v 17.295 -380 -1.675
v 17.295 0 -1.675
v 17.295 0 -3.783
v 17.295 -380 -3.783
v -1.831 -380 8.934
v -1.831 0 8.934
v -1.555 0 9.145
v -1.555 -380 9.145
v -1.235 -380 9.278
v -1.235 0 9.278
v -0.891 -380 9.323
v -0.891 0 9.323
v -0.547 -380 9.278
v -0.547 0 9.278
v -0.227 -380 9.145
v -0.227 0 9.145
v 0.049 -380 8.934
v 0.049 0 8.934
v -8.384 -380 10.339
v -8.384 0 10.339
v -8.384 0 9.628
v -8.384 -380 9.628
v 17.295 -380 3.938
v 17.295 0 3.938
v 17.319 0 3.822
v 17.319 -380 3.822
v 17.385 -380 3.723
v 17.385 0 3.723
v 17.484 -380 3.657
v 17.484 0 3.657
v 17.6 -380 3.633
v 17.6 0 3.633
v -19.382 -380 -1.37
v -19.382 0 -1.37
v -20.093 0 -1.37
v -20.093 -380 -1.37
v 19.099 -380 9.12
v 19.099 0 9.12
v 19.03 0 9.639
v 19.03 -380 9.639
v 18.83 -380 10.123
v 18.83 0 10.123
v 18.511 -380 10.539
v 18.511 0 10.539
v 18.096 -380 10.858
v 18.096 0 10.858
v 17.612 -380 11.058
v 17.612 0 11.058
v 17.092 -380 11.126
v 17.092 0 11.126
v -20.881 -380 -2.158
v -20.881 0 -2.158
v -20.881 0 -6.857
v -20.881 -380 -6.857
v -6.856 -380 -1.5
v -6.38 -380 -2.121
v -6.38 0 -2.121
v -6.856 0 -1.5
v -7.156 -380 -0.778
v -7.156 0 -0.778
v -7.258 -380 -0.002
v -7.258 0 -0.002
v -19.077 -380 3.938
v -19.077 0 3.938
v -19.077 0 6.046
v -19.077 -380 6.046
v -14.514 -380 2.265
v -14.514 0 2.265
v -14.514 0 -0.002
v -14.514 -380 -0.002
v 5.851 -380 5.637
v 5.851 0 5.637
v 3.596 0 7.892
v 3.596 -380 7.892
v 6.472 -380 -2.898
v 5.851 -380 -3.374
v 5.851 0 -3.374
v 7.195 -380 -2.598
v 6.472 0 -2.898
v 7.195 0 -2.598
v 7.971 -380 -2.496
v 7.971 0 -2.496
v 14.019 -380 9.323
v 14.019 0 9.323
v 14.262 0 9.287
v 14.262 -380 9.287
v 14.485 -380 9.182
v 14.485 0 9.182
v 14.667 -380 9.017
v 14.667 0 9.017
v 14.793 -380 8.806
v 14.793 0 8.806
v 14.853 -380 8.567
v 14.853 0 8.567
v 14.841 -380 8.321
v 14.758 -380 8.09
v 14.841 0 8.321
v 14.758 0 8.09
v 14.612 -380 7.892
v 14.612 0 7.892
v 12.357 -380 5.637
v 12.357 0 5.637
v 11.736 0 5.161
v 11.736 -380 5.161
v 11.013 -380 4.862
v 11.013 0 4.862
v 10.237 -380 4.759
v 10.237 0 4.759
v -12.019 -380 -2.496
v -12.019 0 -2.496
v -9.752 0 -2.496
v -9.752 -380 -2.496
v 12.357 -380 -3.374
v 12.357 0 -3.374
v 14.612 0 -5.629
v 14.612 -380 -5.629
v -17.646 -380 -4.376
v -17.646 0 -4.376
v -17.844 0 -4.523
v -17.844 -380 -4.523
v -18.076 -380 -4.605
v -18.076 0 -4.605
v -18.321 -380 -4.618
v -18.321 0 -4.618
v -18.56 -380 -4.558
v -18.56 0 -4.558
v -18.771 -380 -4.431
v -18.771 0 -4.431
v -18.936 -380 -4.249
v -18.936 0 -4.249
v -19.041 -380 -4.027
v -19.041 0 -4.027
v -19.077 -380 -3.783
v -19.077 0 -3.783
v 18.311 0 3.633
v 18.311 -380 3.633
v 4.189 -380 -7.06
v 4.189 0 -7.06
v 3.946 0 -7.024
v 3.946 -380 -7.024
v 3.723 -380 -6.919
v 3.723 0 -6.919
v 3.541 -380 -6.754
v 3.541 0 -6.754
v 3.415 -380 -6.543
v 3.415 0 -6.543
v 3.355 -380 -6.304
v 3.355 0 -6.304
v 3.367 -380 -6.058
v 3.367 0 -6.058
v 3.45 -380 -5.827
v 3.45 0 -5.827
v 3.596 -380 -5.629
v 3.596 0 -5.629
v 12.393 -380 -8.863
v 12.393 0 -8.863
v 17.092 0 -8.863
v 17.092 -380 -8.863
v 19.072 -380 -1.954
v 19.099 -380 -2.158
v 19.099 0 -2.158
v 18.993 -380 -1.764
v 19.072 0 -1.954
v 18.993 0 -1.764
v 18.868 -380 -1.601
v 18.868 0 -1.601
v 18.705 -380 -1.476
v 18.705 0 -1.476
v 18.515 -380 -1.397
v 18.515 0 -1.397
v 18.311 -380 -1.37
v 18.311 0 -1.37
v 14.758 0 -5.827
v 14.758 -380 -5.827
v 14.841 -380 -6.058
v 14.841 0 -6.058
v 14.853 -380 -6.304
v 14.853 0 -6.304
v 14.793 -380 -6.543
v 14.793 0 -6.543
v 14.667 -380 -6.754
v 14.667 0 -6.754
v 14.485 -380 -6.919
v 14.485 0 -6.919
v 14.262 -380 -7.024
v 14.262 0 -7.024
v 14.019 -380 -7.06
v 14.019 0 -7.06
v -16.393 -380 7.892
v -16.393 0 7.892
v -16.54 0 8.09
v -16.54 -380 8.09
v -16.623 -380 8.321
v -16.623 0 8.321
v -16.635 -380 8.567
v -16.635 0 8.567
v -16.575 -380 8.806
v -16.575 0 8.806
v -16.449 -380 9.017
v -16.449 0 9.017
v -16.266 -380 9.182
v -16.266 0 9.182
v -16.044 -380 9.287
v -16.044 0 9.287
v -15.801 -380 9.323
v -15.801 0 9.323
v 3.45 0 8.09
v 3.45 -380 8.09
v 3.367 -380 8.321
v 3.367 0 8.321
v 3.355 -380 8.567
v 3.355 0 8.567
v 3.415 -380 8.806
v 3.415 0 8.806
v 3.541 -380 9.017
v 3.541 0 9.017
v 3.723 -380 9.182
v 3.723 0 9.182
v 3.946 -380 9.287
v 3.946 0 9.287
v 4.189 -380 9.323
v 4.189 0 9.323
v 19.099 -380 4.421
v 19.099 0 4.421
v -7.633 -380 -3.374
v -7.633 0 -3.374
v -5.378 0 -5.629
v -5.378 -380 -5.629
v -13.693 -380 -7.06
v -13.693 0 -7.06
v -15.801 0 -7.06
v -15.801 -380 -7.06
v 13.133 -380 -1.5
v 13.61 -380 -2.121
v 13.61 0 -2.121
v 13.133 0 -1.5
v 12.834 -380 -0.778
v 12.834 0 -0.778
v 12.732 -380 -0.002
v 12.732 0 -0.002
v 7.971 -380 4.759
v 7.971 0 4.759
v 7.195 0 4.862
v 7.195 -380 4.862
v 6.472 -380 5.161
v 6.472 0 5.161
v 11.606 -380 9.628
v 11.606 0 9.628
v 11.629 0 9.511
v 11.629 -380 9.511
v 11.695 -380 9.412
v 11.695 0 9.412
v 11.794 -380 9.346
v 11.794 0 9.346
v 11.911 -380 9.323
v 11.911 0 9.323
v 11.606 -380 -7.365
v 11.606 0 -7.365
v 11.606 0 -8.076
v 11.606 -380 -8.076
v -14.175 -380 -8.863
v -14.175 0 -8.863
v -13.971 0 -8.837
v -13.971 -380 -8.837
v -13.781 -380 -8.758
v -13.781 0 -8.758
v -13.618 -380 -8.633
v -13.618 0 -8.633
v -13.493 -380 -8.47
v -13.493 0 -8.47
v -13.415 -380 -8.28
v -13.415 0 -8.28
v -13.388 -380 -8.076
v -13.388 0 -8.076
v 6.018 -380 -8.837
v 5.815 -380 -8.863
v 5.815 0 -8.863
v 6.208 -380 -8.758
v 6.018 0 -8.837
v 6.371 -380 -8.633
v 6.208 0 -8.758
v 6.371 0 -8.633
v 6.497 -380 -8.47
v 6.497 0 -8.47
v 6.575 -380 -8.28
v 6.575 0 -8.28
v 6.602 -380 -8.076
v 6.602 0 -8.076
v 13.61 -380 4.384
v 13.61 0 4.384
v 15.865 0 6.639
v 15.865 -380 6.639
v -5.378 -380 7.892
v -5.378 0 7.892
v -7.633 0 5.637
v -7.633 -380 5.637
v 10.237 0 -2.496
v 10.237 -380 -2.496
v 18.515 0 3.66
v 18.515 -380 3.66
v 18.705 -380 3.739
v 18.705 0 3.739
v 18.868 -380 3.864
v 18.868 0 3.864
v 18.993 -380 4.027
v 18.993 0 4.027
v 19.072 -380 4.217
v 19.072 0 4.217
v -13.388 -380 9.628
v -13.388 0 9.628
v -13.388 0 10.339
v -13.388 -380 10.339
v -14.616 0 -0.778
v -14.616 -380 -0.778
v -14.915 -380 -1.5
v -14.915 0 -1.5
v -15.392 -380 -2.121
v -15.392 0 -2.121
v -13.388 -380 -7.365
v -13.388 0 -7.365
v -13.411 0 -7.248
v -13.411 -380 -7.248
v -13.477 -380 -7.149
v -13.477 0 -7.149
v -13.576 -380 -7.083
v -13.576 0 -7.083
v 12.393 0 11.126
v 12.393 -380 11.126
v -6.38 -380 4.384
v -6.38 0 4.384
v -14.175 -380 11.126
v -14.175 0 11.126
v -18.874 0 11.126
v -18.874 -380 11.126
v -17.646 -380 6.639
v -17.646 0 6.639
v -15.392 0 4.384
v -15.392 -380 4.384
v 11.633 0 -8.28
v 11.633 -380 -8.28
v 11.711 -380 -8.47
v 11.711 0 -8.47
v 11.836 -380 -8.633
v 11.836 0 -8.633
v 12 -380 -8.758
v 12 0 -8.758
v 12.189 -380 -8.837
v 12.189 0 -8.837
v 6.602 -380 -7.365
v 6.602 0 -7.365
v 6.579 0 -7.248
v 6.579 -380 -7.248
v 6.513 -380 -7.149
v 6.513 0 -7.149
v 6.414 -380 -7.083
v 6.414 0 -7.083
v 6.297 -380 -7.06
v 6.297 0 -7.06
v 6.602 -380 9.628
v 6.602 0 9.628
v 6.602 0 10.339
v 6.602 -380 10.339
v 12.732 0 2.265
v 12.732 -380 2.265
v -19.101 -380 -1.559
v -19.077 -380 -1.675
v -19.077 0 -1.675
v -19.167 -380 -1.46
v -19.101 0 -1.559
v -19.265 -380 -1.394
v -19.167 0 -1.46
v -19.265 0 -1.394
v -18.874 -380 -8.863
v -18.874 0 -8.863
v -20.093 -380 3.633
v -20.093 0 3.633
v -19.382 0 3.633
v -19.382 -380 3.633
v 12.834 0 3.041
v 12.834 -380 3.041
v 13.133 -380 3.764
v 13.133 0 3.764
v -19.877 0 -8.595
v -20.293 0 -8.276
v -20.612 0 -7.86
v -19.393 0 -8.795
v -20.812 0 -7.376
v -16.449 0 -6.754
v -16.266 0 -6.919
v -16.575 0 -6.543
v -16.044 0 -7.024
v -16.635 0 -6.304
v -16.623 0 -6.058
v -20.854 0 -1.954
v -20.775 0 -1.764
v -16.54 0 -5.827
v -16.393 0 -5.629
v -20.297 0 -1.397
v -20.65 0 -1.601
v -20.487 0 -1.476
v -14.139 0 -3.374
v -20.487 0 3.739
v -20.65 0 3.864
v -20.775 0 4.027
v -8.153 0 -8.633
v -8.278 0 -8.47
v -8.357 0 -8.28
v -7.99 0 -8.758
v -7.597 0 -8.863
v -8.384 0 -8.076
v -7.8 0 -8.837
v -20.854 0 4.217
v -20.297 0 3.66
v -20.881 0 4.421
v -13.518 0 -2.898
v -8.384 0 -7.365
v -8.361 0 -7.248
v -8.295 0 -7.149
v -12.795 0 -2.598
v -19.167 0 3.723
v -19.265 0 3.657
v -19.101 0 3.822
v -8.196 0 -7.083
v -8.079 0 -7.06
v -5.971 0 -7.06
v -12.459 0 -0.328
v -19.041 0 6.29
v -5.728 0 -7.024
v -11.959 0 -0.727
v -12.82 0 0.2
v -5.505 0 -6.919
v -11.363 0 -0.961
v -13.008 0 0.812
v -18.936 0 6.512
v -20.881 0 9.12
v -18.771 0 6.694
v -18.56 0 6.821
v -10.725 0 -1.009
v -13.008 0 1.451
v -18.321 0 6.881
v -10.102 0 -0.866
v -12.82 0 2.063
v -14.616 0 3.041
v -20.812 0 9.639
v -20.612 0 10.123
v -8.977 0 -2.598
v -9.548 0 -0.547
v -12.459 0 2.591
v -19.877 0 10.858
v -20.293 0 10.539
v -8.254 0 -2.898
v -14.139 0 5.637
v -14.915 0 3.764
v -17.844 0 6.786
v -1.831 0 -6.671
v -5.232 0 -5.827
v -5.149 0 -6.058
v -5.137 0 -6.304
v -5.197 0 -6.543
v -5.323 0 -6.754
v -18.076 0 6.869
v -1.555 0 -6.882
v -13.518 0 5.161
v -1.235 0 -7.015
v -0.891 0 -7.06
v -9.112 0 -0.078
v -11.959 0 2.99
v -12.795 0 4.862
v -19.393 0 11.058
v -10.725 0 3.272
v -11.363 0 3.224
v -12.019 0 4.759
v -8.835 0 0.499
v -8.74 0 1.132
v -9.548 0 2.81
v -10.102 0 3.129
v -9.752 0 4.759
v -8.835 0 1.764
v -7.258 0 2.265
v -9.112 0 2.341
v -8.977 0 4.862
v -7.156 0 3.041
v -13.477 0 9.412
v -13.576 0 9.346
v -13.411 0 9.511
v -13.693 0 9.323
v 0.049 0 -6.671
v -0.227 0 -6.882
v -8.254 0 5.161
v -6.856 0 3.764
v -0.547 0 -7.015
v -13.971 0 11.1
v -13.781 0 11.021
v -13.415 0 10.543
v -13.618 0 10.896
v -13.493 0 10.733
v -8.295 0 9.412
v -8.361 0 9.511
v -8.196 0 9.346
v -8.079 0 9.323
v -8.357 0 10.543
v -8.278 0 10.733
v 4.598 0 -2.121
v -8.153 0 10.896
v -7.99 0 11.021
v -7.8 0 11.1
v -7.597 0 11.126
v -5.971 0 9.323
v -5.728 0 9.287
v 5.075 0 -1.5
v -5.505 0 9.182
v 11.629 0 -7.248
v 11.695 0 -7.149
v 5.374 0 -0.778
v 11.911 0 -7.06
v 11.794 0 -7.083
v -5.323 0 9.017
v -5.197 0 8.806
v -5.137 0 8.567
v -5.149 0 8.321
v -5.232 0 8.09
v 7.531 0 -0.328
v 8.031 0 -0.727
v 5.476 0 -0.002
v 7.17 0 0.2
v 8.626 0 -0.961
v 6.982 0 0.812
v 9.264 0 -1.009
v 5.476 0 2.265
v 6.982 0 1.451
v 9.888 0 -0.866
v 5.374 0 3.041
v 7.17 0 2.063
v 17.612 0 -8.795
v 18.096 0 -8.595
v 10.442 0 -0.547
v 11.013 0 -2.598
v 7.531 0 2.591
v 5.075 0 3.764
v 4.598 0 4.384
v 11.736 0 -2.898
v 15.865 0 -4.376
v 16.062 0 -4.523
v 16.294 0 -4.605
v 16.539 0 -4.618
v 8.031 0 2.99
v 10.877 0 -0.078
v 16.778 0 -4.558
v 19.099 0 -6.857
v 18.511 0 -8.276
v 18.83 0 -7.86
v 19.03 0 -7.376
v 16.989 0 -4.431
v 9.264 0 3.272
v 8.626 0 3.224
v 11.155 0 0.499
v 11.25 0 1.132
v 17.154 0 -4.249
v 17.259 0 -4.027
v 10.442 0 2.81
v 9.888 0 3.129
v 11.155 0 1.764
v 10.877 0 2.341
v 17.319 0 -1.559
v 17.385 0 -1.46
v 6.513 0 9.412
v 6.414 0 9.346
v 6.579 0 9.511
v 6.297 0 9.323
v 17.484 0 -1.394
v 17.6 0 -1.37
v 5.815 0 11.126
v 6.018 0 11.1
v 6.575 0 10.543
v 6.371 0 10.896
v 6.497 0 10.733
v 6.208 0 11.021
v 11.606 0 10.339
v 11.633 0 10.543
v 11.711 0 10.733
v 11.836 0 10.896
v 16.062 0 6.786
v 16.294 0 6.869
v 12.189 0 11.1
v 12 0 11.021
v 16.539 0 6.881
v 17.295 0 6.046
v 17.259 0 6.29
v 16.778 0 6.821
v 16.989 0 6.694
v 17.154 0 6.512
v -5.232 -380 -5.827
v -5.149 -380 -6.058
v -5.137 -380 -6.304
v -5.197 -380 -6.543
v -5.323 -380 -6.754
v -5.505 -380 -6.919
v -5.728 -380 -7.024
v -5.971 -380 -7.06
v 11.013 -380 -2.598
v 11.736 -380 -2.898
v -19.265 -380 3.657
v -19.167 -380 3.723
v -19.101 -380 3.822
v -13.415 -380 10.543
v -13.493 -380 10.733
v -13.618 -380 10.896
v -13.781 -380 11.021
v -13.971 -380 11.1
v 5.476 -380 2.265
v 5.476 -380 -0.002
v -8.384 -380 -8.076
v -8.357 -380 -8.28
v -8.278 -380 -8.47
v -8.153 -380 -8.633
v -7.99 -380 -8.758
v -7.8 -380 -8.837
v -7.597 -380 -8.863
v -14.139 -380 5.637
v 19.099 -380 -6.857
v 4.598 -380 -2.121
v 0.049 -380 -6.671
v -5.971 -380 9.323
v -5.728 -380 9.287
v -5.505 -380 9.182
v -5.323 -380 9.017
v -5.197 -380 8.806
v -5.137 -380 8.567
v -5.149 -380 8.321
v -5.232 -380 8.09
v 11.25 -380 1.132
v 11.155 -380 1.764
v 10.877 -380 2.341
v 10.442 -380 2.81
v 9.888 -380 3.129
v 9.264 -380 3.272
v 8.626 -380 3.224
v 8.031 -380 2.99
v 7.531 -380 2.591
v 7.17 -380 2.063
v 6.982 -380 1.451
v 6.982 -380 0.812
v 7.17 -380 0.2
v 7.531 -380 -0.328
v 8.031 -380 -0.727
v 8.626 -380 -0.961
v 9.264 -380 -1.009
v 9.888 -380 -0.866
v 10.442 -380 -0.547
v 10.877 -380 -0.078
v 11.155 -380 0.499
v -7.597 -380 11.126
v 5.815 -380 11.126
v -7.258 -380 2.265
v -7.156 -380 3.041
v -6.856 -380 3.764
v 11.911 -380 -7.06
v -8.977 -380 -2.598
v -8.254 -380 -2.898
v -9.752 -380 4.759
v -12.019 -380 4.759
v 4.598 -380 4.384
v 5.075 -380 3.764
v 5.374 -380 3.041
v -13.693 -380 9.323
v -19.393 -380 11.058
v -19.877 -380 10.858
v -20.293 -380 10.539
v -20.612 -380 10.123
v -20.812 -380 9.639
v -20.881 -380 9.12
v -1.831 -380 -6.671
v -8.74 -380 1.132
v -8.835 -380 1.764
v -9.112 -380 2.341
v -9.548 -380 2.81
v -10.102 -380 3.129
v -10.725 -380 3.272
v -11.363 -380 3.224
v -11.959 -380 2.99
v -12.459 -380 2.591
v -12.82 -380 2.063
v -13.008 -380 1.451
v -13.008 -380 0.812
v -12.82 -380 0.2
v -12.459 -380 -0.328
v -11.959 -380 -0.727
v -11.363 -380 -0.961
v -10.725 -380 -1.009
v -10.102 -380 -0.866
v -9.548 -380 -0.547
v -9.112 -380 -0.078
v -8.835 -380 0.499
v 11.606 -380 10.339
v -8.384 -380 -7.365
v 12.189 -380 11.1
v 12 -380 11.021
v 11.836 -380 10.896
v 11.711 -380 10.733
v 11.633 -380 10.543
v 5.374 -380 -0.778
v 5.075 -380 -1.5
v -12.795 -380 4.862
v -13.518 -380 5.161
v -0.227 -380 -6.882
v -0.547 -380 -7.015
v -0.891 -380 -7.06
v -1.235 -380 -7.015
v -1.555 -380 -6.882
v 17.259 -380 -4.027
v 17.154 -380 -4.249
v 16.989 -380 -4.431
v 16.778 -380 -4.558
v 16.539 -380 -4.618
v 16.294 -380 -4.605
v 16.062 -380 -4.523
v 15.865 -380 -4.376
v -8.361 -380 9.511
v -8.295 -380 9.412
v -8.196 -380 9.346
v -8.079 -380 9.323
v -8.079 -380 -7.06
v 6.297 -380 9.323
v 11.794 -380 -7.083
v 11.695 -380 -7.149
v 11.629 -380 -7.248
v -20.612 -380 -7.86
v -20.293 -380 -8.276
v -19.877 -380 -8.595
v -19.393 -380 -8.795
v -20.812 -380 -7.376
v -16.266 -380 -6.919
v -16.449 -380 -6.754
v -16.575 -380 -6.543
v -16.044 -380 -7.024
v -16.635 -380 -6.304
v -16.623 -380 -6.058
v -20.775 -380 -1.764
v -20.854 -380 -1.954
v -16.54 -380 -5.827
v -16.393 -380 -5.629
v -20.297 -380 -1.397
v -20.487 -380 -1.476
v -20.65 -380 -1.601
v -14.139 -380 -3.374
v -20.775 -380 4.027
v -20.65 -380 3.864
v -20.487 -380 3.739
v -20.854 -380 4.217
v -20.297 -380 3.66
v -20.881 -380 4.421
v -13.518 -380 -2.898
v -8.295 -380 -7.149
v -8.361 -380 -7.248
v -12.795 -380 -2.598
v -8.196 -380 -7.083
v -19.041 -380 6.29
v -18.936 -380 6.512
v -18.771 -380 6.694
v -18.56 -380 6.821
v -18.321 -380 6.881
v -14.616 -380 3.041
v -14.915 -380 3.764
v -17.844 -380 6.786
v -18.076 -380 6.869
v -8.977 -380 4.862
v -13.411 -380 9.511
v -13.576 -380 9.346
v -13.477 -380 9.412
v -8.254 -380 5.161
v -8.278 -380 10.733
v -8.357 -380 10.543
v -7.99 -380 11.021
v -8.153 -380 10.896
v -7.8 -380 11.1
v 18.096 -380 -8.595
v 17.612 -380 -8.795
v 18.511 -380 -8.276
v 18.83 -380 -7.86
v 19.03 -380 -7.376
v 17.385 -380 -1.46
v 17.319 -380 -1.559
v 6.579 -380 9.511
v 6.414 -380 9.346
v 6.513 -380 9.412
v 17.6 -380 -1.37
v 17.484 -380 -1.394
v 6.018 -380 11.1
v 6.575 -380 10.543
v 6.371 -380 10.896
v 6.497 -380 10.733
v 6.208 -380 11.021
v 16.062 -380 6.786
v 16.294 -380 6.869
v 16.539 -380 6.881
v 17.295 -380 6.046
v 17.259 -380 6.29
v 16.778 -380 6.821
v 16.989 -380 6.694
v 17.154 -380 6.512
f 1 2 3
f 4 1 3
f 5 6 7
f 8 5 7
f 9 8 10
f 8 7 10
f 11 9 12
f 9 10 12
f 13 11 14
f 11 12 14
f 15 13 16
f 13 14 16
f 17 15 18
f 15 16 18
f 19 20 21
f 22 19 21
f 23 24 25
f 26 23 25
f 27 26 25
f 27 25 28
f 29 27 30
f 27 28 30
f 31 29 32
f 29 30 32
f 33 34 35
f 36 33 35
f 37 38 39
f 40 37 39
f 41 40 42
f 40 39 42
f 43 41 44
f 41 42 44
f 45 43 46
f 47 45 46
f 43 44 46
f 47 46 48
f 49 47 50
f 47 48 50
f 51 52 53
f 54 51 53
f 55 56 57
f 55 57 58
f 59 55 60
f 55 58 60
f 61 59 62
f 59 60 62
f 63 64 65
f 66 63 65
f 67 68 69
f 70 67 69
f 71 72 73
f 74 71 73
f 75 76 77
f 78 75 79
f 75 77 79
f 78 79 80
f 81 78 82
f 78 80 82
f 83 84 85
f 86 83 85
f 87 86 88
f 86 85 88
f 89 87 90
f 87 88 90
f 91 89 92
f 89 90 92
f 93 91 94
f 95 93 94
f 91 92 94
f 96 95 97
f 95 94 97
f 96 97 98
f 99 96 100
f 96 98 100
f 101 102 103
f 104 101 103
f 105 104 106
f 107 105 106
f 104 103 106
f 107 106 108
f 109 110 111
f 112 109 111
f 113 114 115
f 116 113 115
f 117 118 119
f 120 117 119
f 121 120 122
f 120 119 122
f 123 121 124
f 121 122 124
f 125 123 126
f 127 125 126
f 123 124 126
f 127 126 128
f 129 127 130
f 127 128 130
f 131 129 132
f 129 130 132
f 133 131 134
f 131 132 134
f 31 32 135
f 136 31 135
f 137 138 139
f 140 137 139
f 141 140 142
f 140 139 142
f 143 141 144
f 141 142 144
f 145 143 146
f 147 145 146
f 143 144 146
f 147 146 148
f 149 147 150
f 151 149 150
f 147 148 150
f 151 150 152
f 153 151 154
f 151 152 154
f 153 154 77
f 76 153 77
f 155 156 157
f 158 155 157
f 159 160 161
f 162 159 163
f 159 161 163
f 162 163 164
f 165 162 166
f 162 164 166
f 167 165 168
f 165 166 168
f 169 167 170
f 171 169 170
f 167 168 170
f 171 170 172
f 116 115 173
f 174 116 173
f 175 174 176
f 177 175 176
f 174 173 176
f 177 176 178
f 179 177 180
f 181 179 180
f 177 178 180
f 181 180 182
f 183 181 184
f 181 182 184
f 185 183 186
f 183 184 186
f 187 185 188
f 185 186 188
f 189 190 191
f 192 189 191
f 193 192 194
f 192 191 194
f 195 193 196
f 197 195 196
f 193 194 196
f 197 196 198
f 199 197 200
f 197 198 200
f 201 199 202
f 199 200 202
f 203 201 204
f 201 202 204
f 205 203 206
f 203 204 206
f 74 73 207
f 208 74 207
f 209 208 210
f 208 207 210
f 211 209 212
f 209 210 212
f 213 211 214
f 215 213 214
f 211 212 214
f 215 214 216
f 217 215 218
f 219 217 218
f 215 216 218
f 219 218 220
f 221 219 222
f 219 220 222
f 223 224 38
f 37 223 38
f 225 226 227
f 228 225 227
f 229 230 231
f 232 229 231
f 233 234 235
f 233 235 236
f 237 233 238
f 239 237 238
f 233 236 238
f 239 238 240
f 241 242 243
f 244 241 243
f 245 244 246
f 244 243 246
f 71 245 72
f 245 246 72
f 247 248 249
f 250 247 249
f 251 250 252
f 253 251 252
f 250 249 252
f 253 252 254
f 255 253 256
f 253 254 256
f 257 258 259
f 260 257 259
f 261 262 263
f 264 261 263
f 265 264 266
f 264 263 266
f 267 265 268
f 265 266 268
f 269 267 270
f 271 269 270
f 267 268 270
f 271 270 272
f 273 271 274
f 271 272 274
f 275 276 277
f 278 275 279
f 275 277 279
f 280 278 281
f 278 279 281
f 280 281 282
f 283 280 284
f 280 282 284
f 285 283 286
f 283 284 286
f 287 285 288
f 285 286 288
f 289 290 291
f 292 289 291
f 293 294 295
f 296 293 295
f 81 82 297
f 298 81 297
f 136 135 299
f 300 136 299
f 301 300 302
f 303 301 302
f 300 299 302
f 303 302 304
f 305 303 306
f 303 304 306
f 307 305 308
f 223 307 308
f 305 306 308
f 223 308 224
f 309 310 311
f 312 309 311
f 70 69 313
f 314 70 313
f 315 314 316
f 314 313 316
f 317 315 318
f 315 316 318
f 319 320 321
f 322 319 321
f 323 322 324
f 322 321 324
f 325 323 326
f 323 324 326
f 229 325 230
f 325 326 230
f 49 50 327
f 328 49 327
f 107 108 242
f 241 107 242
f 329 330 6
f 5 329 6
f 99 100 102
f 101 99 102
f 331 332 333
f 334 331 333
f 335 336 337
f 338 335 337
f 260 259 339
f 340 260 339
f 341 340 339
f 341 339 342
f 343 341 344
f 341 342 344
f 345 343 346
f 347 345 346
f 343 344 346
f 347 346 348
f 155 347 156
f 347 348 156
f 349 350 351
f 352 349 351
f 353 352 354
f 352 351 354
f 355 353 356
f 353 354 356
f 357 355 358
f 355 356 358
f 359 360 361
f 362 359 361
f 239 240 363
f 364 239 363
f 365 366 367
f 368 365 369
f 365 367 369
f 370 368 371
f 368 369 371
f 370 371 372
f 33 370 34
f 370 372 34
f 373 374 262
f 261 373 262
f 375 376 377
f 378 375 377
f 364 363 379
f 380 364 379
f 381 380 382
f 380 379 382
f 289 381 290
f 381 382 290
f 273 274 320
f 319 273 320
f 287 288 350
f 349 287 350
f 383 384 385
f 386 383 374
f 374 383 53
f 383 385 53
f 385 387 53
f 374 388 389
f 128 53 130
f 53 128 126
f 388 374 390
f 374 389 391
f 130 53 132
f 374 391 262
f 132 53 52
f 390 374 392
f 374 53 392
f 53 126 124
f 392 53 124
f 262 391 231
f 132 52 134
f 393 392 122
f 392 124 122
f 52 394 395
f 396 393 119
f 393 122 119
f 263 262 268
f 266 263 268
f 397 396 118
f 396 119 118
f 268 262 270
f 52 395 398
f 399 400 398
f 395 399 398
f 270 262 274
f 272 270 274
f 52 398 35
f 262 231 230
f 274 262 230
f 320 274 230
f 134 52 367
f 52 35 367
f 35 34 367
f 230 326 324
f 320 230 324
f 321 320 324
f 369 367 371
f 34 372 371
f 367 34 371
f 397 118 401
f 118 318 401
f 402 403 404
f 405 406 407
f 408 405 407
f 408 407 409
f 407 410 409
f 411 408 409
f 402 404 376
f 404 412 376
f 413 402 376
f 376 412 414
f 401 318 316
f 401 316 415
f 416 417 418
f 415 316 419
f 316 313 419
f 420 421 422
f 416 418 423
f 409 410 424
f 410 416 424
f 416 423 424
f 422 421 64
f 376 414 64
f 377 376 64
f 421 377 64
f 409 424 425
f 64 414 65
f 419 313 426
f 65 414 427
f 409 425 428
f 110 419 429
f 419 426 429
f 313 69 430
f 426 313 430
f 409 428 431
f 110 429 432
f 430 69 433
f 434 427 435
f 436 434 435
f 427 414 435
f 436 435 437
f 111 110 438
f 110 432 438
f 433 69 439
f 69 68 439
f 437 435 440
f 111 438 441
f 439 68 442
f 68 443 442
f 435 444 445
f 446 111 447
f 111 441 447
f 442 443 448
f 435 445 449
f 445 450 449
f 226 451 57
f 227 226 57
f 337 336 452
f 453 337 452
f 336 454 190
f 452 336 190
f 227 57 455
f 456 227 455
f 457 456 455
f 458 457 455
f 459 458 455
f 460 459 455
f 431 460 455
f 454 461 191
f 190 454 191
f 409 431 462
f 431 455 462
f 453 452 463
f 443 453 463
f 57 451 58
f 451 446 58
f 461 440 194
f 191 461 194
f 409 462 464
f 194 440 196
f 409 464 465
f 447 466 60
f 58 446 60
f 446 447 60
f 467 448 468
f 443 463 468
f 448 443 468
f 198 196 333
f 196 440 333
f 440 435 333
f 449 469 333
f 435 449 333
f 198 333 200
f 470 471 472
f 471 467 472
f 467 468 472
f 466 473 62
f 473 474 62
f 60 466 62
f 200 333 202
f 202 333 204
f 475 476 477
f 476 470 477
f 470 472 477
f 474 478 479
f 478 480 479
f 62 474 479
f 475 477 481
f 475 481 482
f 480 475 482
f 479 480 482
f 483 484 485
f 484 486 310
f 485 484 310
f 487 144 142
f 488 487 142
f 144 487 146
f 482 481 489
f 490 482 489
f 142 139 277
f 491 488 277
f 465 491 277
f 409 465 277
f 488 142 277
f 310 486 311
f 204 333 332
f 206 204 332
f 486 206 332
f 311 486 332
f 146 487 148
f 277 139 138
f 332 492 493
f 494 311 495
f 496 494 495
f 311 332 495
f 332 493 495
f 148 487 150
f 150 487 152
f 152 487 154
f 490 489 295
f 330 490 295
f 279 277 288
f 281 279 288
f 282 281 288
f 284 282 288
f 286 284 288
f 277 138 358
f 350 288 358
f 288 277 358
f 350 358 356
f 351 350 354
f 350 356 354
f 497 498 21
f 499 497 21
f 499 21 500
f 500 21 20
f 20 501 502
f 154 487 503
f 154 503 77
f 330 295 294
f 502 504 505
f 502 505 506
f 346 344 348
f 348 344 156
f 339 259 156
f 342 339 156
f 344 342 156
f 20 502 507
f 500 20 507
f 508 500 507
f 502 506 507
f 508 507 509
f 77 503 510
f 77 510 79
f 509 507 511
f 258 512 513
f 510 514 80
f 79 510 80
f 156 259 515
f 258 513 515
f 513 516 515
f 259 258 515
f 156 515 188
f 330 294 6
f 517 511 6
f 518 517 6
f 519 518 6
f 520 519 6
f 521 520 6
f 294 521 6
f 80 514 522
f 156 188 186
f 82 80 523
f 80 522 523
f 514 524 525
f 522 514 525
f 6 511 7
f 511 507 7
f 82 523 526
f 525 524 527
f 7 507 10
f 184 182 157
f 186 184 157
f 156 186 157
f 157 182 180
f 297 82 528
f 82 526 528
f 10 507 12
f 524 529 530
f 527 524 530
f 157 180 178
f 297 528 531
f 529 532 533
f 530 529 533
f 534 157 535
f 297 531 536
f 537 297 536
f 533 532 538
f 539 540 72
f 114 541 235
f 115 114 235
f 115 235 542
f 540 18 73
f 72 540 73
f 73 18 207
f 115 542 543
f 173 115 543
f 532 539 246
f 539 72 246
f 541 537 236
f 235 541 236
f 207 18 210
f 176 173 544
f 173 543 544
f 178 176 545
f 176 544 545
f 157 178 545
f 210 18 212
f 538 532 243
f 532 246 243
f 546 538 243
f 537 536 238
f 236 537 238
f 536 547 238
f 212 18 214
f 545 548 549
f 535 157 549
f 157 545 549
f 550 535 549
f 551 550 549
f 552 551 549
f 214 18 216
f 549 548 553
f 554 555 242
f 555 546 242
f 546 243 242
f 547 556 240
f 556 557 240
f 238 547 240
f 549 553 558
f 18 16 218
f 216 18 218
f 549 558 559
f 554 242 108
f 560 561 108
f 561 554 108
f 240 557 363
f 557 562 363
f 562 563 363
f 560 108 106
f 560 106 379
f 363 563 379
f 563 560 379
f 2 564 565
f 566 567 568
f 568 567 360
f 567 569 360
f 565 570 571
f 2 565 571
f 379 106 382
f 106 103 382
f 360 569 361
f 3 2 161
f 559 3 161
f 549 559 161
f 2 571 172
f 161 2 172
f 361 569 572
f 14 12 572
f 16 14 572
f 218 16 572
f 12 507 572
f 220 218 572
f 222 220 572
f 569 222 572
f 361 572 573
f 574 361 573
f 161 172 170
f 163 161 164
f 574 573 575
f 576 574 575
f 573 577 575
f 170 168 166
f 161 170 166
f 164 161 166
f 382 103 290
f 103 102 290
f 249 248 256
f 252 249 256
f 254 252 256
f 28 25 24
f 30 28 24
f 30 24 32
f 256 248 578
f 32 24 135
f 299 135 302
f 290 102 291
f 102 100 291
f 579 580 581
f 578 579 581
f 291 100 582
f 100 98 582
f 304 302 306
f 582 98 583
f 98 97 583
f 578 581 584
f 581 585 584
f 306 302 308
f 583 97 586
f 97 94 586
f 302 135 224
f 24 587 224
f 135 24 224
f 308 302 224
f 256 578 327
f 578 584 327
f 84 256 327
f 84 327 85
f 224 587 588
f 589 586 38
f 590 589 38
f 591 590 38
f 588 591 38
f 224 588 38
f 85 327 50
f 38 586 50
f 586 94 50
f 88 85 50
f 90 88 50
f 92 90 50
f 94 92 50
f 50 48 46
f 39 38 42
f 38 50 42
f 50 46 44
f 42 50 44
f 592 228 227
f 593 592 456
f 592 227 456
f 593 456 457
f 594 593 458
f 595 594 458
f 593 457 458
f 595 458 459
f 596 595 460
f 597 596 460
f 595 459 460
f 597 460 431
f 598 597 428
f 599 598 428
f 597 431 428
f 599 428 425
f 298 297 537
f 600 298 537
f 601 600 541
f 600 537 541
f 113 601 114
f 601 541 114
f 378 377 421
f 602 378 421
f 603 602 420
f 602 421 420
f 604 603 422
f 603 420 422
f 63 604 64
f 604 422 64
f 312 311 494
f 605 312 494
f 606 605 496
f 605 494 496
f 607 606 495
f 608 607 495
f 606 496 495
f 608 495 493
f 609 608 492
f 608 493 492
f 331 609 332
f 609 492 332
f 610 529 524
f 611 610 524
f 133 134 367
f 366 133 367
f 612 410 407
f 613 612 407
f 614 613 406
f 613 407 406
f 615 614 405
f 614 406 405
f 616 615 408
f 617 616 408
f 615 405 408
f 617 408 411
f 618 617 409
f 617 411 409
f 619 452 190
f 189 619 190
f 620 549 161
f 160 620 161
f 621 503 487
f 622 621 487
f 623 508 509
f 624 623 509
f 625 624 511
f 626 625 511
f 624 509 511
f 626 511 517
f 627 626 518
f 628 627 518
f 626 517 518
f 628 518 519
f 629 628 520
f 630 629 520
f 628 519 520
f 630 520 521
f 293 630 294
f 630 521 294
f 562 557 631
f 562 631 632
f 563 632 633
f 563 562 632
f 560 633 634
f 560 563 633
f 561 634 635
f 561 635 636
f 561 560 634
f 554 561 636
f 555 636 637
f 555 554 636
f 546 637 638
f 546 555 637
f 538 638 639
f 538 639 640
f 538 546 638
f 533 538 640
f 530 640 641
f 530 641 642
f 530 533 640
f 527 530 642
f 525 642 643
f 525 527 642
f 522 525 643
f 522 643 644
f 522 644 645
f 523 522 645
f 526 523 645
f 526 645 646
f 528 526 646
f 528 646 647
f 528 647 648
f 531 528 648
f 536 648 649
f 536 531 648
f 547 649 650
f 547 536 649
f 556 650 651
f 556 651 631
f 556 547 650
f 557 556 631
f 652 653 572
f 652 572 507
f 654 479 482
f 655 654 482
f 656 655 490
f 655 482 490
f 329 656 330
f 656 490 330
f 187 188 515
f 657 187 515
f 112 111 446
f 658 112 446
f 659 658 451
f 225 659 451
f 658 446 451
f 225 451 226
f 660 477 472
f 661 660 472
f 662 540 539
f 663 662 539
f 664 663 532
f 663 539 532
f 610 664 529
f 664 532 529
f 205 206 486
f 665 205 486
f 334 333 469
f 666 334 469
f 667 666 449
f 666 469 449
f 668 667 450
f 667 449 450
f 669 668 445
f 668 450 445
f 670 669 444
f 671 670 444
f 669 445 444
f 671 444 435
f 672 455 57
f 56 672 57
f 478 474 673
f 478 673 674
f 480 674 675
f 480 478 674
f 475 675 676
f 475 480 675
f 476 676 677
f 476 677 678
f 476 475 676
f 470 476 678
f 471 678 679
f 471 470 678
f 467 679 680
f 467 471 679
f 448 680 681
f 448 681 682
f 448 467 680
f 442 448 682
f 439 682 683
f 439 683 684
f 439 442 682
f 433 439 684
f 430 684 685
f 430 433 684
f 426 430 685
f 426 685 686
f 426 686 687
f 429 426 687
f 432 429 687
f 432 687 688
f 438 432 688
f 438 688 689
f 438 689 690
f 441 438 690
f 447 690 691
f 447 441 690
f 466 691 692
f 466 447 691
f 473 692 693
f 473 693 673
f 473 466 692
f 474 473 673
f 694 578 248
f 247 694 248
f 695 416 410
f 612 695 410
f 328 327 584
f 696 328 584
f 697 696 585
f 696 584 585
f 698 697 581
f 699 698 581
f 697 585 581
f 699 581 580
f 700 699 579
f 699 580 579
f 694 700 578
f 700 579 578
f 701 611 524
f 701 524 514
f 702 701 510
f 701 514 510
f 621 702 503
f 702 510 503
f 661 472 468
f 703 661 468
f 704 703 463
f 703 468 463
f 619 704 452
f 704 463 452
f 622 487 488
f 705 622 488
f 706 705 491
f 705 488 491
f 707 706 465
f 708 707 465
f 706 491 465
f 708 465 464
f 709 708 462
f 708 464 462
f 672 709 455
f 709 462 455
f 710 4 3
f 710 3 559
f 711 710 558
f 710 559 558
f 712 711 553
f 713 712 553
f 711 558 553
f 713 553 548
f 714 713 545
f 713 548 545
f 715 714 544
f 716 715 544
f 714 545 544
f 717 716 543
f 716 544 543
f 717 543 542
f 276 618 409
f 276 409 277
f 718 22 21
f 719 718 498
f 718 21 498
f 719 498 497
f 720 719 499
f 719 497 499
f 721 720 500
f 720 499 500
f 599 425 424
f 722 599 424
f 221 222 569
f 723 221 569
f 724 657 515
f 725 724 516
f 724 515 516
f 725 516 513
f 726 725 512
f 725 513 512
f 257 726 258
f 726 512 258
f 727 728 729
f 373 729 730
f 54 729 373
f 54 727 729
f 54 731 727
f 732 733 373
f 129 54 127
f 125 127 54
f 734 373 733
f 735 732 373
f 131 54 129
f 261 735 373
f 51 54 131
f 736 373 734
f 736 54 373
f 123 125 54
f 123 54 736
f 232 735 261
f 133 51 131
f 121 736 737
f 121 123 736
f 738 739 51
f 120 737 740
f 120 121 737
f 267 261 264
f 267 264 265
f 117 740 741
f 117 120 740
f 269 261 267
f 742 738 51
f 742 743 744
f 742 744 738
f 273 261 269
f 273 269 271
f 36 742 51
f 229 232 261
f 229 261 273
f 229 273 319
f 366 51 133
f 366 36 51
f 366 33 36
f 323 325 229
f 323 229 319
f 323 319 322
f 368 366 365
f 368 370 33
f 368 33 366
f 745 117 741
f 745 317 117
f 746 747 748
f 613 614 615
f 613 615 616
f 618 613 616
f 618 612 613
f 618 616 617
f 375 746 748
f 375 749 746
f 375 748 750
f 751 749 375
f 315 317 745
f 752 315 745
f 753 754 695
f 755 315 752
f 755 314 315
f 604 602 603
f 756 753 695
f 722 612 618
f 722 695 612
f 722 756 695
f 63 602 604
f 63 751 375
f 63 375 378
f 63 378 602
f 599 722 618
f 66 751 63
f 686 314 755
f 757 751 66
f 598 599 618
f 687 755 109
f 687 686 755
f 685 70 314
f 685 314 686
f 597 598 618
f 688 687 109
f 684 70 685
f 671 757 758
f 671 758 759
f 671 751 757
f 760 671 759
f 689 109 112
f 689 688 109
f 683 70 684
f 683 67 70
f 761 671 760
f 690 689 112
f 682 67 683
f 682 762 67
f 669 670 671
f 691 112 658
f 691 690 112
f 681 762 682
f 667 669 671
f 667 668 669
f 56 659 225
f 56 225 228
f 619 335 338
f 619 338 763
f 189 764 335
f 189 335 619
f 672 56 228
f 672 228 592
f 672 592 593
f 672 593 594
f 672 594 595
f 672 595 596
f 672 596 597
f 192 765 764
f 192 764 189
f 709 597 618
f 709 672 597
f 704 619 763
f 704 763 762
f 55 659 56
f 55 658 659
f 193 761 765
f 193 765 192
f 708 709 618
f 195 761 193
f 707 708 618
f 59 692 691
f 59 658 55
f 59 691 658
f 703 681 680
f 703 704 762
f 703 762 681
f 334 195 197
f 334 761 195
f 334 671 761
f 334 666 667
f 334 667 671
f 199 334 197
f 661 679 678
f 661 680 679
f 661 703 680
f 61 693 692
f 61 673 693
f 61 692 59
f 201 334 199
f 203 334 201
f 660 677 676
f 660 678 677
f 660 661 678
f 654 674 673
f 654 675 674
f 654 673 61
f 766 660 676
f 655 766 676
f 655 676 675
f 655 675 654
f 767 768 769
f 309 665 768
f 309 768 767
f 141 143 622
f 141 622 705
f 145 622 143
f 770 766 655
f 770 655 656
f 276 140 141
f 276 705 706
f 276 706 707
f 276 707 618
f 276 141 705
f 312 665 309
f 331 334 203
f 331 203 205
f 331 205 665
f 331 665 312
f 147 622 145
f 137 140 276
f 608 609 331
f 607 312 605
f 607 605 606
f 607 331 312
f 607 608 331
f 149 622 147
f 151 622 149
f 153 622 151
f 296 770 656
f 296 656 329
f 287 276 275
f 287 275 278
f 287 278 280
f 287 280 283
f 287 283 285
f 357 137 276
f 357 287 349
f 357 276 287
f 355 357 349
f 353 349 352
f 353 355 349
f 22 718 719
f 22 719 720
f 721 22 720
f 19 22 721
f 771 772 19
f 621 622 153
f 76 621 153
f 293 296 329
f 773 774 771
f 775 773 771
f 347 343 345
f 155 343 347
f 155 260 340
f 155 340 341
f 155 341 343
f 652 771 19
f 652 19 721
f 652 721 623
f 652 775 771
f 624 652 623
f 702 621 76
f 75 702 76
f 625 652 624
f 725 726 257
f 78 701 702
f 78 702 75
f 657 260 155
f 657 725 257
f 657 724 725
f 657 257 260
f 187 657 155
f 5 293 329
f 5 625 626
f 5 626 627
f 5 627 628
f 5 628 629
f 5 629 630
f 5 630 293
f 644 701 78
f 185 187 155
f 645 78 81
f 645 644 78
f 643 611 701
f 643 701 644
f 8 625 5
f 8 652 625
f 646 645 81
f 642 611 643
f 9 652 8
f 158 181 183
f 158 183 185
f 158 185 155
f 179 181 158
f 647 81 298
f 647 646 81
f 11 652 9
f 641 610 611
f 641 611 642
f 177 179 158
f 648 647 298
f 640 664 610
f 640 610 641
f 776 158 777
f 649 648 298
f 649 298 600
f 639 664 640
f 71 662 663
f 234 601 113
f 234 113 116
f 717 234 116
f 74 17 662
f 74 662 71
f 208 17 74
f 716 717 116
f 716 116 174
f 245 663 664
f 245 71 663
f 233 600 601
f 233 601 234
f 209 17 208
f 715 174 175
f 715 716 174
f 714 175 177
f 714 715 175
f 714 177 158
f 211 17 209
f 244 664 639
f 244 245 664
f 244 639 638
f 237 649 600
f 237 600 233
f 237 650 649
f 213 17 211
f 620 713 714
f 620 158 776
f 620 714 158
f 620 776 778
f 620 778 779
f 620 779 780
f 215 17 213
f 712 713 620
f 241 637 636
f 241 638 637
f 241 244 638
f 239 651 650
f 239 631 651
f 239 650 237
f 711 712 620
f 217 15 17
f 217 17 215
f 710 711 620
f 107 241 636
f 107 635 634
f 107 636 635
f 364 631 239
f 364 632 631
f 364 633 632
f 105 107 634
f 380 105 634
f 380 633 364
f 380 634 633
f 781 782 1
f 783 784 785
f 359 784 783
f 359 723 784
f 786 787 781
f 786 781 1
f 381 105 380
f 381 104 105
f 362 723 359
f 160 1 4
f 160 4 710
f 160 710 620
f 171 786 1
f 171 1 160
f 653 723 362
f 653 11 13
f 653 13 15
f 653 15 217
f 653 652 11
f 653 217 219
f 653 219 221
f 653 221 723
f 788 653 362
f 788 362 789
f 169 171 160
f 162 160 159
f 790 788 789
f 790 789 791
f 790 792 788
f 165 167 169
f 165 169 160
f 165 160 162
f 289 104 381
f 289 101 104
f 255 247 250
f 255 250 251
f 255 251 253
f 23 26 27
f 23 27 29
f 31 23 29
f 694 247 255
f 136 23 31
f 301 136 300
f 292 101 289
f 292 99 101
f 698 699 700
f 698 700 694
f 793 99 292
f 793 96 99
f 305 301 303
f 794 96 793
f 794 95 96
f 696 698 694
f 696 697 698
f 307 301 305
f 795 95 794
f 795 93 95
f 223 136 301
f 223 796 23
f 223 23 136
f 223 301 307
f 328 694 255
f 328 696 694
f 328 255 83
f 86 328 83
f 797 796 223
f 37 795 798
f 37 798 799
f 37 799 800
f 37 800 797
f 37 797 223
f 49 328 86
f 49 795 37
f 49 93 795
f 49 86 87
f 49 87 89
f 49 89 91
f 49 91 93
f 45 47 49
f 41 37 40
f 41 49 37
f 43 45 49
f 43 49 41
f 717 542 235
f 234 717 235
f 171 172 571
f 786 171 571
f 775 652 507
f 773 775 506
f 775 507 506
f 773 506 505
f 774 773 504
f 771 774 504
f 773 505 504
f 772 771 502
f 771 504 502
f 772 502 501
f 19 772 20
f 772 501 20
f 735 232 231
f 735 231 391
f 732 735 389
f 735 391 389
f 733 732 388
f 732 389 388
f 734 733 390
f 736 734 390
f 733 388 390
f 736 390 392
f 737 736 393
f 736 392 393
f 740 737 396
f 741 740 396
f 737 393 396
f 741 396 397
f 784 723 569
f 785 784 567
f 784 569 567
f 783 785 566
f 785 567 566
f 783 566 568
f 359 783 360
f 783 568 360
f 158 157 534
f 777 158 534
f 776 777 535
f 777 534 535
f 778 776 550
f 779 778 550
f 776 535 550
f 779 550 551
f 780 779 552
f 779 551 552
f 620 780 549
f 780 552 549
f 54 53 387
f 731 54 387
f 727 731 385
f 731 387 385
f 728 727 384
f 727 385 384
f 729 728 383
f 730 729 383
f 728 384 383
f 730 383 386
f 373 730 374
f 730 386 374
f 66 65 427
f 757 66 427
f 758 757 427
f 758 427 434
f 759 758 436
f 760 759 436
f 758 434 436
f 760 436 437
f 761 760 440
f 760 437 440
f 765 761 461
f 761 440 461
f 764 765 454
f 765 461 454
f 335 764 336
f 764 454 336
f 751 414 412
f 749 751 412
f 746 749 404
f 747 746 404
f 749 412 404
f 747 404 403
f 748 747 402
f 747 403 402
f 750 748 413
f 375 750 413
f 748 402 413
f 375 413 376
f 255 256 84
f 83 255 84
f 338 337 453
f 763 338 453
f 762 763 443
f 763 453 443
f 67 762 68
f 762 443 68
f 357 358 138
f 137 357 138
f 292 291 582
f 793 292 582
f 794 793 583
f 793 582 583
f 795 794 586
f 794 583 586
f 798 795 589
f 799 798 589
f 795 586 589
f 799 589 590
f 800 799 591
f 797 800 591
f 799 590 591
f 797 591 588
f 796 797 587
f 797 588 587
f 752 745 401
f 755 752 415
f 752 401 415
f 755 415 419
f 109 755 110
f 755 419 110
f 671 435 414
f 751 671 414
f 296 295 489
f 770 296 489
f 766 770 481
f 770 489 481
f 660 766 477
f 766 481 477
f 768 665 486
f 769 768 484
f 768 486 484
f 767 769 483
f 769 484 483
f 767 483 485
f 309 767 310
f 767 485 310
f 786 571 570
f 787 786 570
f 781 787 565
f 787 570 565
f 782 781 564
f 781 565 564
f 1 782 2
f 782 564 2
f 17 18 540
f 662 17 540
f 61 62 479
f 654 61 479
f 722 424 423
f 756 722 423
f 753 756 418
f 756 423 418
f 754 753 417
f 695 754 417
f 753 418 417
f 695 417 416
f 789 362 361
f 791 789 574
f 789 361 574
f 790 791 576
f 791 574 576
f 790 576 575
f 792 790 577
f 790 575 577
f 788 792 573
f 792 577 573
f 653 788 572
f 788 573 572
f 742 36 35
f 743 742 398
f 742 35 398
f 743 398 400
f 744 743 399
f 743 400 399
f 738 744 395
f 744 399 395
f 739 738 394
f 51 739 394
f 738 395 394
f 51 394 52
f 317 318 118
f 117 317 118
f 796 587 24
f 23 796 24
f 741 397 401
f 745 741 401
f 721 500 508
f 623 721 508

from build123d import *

# Parameters (mm, degrees)
F0_R     = 2.1463
F1_DEPTH = 380


with BuildPart() as f1:
    # F0 (on Front) → F1 (new body)
    with BuildSketch(Plane.XZ):
        with BuildLine():
            Line((-9.75241, 4.759444), (-12.019248, 4.759444))
            ThreePointArc((-12.019248, 4.759444), (-13.166227, 4.987592), (-14.138589, 5.637303))
            Line((-14.138589, 5.637303), (-16.393426, 7.892141))
            ThreePointArc((-16.393426, 7.892141), (-16.575125, 8.805603), (-15.800729, 9.323038))
            Line((-15.800729, 9.323038), (-13.692529, 9.323038))
            ThreePointArc((-13.692529, 9.323038), (-13.477003, 9.412312), (-13.387729, 9.627838))
            Line((-13.387729, 9.627838), (-13.387729, 10.339038))
            ThreePointArc((-13.387729, 10.339038), (-13.618353, 10.895814), (-14.175129, 11.126438))
            Line((-14.175129, 11.126438), (-18.874129, 11.126438))
            ThreePointArc((-18.874129, 11.126438), (-20.29301, 10.538718), (-20.880729, 9.119838))
            Line((-20.880729, 9.119838), (-20.880729, 4.420838))
            ThreePointArc((-20.880729, 4.420838), (-20.650105, 3.864062), (-20.093329, 3.633438))
            Line((-20.093329, 3.633438), (-19.382129, 3.633438))
            ThreePointArc((-19.382129, 3.633438), (-19.166603, 3.722712), (-19.077329, 3.938238))
            Line((-19.077329, 3.938238), (-19.077329, 6.046438))
            ThreePointArc((-19.077329, 6.046438), (-18.559895, 6.820834), (-17.646432, 6.639135))
            Line((-17.646432, 6.639135), (-15.391595, 4.384297))
            ThreePointArc((-15.391595, 4.384297), (-14.741884, 3.411936), (-14.513736, 2.264957))
            Line((-14.513736, 2.264957), (-14.513736, -0.001881))
            ThreePointArc((-14.513736, -0.001881), (-14.741884, -1.14886), (-15.391595, -2.121222))
            Line((-15.391595, -2.121222), (-17.646432, -4.376059))
            ThreePointArc((-17.646432, -4.376059), (-18.559895, -4.557758), (-19.077329, -3.783362))
            Line((-19.077329, -3.783362), (-19.077329, -1.675162))
            ThreePointArc((-19.077329, -1.675162), (-19.166603, -1.459636), (-19.382129, -1.370362))
            Line((-19.382129, -1.370362), (-20.093329, -1.370362))
            ThreePointArc((-20.093329, -1.370362), (-20.650105, -1.600986), (-20.880729, -2.157762))
            Line((-20.880729, -2.157762), (-20.880729, -6.856762))
            ThreePointArc((-20.880729, -6.856762), (-20.29301, -8.275643), (-18.874129, -8.863362))
            Line((-18.874129, -8.863362), (-14.175129, -8.863362))
            ThreePointArc((-14.175129, -8.863362), (-13.618353, -8.632738), (-13.387729, -8.075962))
            Line((-13.387729, -8.075962), (-13.387729, -7.364762))
            ThreePointArc((-13.387729, -7.364762), (-13.477003, -7.149236), (-13.692529, -7.059962))
            Line((-13.692529, -7.059962), (-15.800729, -7.059962))
            ThreePointArc((-15.800729, -7.059962), (-16.575125, -6.542528), (-16.393426, -5.629065))
            Line((-16.393426, -5.629065), (-14.138589, -3.374228))
            ThreePointArc((-14.138589, -3.374228), (-13.166227, -2.724517), (-12.019248, -2.496368))
            Line((-12.019248, -2.496368), (-9.75241, -2.496368))
            ThreePointArc((-9.75241, -2.496368), (-8.605431, -2.724517), (-7.63307, -3.374228))
            Line((-7.63307, -3.374228), (-5.378232, -5.629065))
            ThreePointArc((-5.378232, -5.629065), (-5.196534, -6.542528), (-5.970929, -7.059962))
            Line((-5.970929, -7.059962), (-8.079129, -7.059962))
            ThreePointArc((-8.079129, -7.059962), (-8.294656, -7.149236), (-8.383929, -7.364762))
            Line((-8.383929, -7.364762), (-8.383929, -8.075962))
            ThreePointArc((-8.383929, -8.075962), (-8.153305, -8.632738), (-7.596529, -8.863362))
            Line((-7.596529, -8.863362), (5.814671, -8.863362))
            ThreePointArc((5.814671, -8.863362), (6.371447, -8.632738), (6.602071, -8.075962))
            Line((6.602071, -8.075962), (6.602071, -7.364762))
            ThreePointArc((6.602071, -7.364762), (6.512797, -7.149236), (6.297271, -7.059962))
            Line((6.297271, -7.059962), (4.189071, -7.059962))
            ThreePointArc((4.189071, -7.059962), (3.414675, -6.542528), (3.596374, -5.629065))
            Line((3.596374, -5.629065), (5.851211, -3.374228))
            ThreePointArc((5.851211, -3.374228), (6.823573, -2.724517), (7.970552, -2.496368))
            Line((7.970552, -2.496368), (10.23739, -2.496368))
            ThreePointArc((10.23739, -2.496368), (11.384369, -2.724517), (12.35673, -3.374228))
            Line((12.35673, -3.374228), (14.611568, -5.629065))
            ThreePointArc((14.611568, -5.629065), (14.793266, -6.542528), (14.018871, -7.059962))
            Line((14.018871, -7.059962), (11.910671, -7.059962))
            ThreePointArc((11.910671, -7.059962), (11.695144, -7.149236), (11.605871, -7.364762))
            Line((11.605871, -7.364762), (11.605871, -8.075962))
            ThreePointArc((11.605871, -8.075962), (11.836495, -8.632738), (12.393271, -8.863362))
            Line((12.393271, -8.863362), (17.092271, -8.863362))
            ThreePointArc((17.092271, -8.863362), (18.511151, -8.275643), (19.098871, -6.856762))
            Line((19.098871, -6.856762), (19.098871, -2.157762))
            ThreePointArc((19.098871, -2.157762), (18.868247, -1.600986), (18.311471, -1.370362))
            Line((18.311471, -1.370362), (17.600271, -1.370362))
            ThreePointArc((17.600271, -1.370362), (17.384744, -1.459636), (17.295471, -1.675162))
            Line((17.295471, -1.675162), (17.295471, -3.783362))
            ThreePointArc((17.295471, -3.783362), (16.778036, -4.557758), (15.864574, -4.376059))
            Line((15.864574, -4.376059), (13.609736, -2.121222))
            ThreePointArc((13.609736, -2.121222), (12.960025, -1.14886), (12.731877, -0.001881))
            Line((12.731877, -0.001881), (12.731877, 2.264957))
            ThreePointArc((12.731877, 2.264957), (12.960025, 3.411936), (13.609736, 4.384297))
            Line((13.609736, 4.384297), (15.864574, 6.639135))
            ThreePointArc((15.864574, 6.639135), (16.778036, 6.820834), (17.295471, 6.046438))
            Line((17.295471, 6.046438), (17.295471, 3.938238))
            ThreePointArc((17.295471, 3.938238), (17.384744, 3.722712), (17.600271, 3.633438))
            Line((17.600271, 3.633438), (18.311471, 3.633438))
            ThreePointArc((18.311471, 3.633438), (18.868247, 3.864062), (19.098871, 4.420838))
            Line((19.098871, 4.420838), (19.098871, 9.119838))
            ThreePointArc((19.098871, 9.119838), (18.511151, 10.538718), (17.092271, 11.126438))
            Line((17.092271, 11.126438), (12.393271, 11.126438))
            ThreePointArc((12.393271, 11.126438), (11.836495, 10.895814), (11.605871, 10.339038))
            Line((11.605871, 10.339038), (11.605871, 9.627838))
            ThreePointArc((11.605871, 9.627838), (11.695144, 9.412312), (11.910671, 9.323038))
            Line((11.910671, 9.323038), (14.018871, 9.323038))
            ThreePointArc((14.018871, 9.323038), (14.793266, 8.805603), (14.611568, 7.892141))
            Line((14.611568, 7.892141), (12.35673, 5.637303))
            ThreePointArc((12.35673, 5.637303), (11.384369, 4.987592), (10.23739, 4.759444))
            Line((10.23739, 4.759444), (7.970552, 4.759444))
            ThreePointArc((7.970552, 4.759444), (6.823573, 4.987592), (5.851211, 5.637303))
            Line((5.851211, 5.637303), (3.596374, 7.892141))
            ThreePointArc((3.596374, 7.892141), (3.414675, 8.805603), (4.189071, 9.323038))
            Line((4.189071, 9.323038), (6.297271, 9.323038))
            ThreePointArc((6.297271, 9.323038), (6.512797, 9.412312), (6.602071, 9.627838))
            Line((6.602071, 9.627838), (6.602071, 10.339038))
            ThreePointArc((6.602071, 10.339038), (6.371447, 10.895814), (5.814671, 11.126438))
            Line((5.814671, 11.126438), (-7.596529, 11.126438))
            ThreePointArc((-7.596529, 11.126438), (-8.153305, 10.895814), (-8.383929, 10.339038))
            Line((-8.383929, 10.339038), (-8.383929, 9.627838))
            ThreePointArc((-8.383929, 9.627838), (-8.294656, 9.412312), (-8.079129, 9.323038))
            Line((-8.079129, 9.323038), (-5.970929, 9.323038))
            ThreePointArc((-5.970929, 9.323038), (-5.196534, 8.805603), (-5.378232, 7.892141))
            Line((-5.378232, 7.892141), (-7.63307, 5.637303))
            ThreePointArc((-7.63307, 5.637303), (-8.605431, 4.987592), (-9.75241, 4.759444))
        make_face()
        with Locations((-10.885829, 1.131538)):
            Circle(F0_R, mode=Mode.SUBTRACT)
        with BuildLine():
            Line((-7.257923, -0.001881), (-7.257923, 2.264957))
            ThreePointArc((-7.257923, 2.264957), (-7.029775, 3.411936), (-6.380064, 4.384297))
            Line((-6.380064, 4.384297), (-1.83051, 8.933851))
            ThreePointArc((-1.83051, 8.933851), (-0.890929, 9.323038), (0.048652, 8.933851))
            Line((0.048652, 8.933851), (4.598205, 4.384297))
            ThreePointArc((4.598205, 4.384297), (5.247916, 3.411936), (5.476064, 2.264957))
            Line((5.476064, 2.264957), (5.476064, -0.001881))
            ThreePointArc((5.476064, -0.001881), (5.247916, -1.14886), (4.598205, -2.121222))
            Line((4.598205, -2.121222), (0.048652, -6.670775))
            ThreePointArc((0.048652, -6.670775), (-0.890929, -7.059962), (-1.83051, -6.670775))
            Line((-1.83051, -6.670775), (-6.380064, -2.121222))
            ThreePointArc((-6.380064, -2.121222), (-7.029775, -1.14886), (-7.257923, -0.001881))
        make_face(mode=Mode.SUBTRACT)
        with Locations((9.103971, 1.131538)):
            Circle(F0_R, mode=Mode.SUBTRACT)
    extrude(amount=F1_DEPTH)


solid = f1.part
